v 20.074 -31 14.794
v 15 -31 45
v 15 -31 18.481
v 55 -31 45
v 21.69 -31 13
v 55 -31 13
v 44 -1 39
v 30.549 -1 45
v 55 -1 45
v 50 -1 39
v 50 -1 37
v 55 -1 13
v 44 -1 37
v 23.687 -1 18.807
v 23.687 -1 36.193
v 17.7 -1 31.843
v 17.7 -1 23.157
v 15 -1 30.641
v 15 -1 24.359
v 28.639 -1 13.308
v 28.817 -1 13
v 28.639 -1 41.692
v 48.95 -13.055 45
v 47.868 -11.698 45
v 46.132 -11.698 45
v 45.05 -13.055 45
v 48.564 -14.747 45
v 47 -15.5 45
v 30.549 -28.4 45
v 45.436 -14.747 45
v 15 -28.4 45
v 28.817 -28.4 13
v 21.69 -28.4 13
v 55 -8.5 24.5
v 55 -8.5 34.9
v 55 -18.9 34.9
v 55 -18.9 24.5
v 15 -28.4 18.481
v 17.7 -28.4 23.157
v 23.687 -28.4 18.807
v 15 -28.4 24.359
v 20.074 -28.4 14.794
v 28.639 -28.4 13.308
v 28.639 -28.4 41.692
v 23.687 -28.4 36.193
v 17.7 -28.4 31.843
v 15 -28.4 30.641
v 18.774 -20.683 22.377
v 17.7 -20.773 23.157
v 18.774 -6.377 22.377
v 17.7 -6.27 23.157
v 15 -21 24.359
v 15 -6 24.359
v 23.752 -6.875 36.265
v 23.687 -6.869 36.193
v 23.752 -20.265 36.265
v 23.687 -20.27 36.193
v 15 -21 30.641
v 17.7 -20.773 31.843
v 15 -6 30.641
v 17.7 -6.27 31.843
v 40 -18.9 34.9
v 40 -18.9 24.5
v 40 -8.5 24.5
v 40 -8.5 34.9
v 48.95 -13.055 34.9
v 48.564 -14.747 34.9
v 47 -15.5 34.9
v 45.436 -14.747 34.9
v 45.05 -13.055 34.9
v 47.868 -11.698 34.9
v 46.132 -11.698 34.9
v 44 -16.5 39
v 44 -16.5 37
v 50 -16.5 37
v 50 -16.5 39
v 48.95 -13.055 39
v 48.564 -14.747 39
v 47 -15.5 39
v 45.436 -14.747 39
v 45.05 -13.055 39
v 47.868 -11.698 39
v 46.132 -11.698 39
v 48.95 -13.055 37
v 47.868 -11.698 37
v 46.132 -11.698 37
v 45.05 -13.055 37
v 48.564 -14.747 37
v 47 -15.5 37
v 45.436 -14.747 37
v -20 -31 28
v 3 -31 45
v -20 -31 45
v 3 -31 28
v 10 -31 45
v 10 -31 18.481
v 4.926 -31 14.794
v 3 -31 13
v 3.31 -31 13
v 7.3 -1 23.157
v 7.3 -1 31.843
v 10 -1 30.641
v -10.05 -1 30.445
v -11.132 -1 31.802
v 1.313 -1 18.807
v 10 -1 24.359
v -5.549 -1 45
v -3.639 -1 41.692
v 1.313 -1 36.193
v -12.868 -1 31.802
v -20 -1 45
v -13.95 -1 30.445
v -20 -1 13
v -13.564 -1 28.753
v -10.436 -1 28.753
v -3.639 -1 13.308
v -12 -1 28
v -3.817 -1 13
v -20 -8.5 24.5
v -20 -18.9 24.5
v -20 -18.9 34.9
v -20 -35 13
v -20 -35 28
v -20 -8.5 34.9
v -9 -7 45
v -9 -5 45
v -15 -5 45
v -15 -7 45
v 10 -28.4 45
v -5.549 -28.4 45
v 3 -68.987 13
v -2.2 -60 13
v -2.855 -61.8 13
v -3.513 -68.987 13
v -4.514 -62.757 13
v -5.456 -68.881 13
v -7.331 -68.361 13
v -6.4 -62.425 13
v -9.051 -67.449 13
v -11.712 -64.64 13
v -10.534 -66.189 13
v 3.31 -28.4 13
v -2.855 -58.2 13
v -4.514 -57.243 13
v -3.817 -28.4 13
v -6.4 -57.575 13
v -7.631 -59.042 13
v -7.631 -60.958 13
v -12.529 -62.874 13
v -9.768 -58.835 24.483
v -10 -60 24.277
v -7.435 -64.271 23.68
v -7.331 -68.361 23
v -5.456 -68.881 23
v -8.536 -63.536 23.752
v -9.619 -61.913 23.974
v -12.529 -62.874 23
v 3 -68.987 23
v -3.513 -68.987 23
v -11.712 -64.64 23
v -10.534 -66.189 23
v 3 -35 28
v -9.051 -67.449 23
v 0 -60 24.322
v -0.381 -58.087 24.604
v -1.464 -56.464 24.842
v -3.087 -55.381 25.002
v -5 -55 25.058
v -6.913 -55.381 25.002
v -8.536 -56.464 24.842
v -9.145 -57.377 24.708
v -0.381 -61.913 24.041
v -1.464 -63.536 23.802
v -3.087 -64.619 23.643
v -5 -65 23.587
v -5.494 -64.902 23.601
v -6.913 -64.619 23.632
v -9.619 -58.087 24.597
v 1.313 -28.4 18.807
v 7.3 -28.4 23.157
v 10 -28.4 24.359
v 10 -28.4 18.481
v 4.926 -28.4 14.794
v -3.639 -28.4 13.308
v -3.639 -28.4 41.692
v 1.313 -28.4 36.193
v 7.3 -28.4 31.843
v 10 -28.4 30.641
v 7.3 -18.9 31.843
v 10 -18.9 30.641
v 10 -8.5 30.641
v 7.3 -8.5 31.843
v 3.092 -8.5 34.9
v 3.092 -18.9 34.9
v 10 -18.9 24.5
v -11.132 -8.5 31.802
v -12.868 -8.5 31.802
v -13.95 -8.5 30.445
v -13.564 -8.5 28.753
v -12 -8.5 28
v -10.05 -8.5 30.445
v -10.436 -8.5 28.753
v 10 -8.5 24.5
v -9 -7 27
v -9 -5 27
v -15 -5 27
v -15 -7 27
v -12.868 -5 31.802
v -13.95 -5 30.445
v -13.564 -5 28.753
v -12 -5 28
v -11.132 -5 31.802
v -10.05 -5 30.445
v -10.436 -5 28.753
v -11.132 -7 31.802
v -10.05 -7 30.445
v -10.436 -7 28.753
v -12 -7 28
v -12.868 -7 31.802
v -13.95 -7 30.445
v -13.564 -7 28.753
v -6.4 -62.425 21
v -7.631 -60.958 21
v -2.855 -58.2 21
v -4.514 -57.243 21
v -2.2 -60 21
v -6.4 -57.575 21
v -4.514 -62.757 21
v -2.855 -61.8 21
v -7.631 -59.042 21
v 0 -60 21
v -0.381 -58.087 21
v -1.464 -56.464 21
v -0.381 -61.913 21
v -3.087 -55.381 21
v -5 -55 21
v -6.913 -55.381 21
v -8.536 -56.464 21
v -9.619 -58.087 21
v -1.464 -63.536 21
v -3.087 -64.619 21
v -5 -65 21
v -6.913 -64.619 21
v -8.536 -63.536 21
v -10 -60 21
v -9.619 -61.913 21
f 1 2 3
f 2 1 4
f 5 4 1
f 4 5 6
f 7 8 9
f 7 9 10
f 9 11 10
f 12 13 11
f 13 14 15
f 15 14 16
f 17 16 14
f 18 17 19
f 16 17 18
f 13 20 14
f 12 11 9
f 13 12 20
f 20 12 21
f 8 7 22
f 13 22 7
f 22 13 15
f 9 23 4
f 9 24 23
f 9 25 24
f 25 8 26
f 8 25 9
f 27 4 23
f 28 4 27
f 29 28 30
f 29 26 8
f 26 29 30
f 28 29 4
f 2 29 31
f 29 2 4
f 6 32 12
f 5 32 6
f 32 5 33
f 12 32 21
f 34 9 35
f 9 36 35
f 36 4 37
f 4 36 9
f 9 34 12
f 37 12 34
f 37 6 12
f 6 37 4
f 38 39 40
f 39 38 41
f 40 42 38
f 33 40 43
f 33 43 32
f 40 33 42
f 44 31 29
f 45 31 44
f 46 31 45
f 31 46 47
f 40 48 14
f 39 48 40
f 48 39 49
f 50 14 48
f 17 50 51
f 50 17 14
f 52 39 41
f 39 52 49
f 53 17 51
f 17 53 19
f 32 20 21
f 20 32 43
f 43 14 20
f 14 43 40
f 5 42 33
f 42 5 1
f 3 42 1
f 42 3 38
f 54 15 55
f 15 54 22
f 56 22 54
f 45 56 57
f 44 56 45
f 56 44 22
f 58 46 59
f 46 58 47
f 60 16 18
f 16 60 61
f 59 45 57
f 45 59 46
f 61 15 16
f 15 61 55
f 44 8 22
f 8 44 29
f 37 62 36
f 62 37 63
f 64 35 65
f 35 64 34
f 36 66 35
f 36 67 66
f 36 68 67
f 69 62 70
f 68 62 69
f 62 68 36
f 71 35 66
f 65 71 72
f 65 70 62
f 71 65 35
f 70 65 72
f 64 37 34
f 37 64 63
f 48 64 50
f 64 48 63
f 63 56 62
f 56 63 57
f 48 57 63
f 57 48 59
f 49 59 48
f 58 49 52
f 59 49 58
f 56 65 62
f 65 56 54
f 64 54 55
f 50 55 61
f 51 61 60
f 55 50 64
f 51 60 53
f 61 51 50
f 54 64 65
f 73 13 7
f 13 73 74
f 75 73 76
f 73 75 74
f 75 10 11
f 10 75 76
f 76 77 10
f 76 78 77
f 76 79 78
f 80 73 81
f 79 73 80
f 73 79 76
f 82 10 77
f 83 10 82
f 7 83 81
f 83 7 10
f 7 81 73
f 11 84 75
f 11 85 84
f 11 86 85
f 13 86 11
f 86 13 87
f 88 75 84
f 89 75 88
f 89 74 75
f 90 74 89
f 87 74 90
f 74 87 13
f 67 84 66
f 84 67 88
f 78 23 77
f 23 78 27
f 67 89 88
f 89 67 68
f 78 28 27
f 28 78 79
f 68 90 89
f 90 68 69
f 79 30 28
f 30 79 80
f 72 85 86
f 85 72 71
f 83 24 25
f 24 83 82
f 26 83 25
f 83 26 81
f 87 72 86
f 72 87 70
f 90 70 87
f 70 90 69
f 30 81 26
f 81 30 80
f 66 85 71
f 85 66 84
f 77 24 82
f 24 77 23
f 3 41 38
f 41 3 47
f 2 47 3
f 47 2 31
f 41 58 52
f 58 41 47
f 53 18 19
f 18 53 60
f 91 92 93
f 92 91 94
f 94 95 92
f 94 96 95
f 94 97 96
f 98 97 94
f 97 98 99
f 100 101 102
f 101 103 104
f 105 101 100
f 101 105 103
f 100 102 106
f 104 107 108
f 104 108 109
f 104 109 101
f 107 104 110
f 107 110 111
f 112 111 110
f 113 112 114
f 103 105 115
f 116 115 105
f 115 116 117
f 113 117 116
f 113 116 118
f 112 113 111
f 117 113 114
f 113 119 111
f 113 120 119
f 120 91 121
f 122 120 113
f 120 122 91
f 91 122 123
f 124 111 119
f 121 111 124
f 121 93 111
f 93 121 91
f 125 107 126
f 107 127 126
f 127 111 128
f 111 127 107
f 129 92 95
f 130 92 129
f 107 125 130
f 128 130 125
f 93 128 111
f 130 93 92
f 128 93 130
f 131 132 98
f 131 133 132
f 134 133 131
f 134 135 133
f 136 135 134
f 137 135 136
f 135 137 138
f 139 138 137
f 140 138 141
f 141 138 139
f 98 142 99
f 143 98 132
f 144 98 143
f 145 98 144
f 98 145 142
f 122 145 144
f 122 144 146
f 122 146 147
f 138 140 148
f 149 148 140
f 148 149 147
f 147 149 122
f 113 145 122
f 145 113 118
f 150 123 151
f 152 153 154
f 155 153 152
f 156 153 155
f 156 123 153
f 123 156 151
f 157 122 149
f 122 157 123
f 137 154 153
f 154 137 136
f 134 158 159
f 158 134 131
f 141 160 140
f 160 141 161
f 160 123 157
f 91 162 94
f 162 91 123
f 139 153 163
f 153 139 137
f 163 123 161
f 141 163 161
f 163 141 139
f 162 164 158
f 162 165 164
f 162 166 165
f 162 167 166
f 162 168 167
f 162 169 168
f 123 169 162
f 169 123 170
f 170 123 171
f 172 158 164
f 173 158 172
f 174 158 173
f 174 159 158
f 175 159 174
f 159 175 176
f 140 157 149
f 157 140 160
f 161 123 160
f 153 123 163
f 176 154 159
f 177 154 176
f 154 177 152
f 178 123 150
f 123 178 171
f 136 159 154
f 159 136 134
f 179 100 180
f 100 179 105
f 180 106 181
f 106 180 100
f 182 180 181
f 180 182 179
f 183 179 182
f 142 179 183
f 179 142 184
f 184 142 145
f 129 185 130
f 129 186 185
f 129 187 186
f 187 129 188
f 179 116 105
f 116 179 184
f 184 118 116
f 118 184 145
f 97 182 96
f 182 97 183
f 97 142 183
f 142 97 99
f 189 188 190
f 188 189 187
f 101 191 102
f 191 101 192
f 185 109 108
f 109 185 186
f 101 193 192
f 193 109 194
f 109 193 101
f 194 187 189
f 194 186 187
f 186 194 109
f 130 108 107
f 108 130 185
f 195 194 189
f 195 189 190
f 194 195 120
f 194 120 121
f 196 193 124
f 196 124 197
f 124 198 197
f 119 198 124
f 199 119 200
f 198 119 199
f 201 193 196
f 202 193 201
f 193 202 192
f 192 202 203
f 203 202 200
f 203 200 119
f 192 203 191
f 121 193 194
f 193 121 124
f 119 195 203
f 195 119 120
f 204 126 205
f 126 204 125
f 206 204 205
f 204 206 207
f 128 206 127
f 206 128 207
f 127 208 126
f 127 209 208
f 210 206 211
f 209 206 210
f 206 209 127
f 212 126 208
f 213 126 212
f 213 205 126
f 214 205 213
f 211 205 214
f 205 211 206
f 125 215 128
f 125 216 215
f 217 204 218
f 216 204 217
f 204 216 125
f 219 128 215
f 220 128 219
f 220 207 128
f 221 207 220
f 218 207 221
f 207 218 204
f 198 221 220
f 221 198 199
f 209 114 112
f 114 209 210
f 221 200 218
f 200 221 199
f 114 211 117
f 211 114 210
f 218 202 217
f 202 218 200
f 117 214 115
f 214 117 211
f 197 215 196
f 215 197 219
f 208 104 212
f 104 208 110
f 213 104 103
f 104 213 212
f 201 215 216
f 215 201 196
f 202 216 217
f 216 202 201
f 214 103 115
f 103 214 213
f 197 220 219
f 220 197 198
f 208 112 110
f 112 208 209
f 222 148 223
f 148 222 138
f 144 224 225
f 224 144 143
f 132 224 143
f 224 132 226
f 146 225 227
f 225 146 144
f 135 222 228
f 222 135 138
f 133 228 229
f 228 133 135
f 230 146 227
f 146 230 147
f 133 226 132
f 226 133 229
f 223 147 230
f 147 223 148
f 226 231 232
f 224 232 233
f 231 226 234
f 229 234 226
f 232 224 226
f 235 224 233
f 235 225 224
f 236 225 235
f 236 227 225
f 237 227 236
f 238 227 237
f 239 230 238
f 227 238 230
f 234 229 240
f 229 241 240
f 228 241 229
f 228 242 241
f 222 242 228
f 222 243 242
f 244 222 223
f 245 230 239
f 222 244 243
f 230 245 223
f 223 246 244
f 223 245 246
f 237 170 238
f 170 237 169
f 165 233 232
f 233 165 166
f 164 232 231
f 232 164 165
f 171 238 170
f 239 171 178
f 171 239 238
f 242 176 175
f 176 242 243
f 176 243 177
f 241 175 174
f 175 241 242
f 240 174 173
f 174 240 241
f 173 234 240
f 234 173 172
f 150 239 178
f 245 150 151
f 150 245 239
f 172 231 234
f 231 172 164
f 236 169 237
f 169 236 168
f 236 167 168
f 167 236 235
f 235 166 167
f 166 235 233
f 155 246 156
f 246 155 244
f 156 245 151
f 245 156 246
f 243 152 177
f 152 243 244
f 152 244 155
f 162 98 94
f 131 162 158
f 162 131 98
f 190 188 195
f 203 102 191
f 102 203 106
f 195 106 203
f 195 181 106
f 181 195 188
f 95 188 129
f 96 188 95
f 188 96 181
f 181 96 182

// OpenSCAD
forwarder_wheel_radius =35;
forwarder_wheel_axis_radius =4;
forwarder_wheel_height =50;
forwarder_wheel_space =0.4;
//projection() translate([0,0,45])rotate([0,90,0])	
//	translate([50,41,4])rotate([0,-90,-180])cutblock();

//translate([100,0,0]){
//	gear();
//	translate([25,0,0])gearcutter();
//}

//projection() translate([0,0,83])rotate([0,90,0])	
//rotate([90,0,0])forwarder();


forwarderFront();
translate([25,0,0])forwarderBack();


//funnelblock();

module forwarderFront(){
	difference(){
		rotate([90,0,0])forwarder();
		translate([-100,-90,0])cube([100,100,100]);
	}
}
module forwarderBack(){
	difference(){
		rotate([90,0,0])forwarder();
		translate([0,-90,0])cube([100,100,100]);
	}
}

module funnelblock(){
	scale([1,0.5,1]){
		
		difference(){
			union(){
				difference(){
					union(){
						translate([0,0,0])cylinder(h=50,r=20);
						translate([0,0,0])rotate([0,90,0])cylinder(h=50,r=20);
						translate([50,0,0])rotate([0,0,0])cylinder(h=50,r=20);
						translate([0,0,50])rotate([0,90,0])cylinder(h=50,r=20);
					}
					translate([30.25,-30,19.75])rotate([0,0,90])aluguide();
					translate([-25,0,-25])cube([100,100,100]);
					translate([-25,-25,-25])cube([25,100,100]);
					translate([50,-25,-25])cube([25,100,100]);
					translate([-25,-25,-25])cube([100,100,25]);
					translate([-25,-25,50])cube([100,100,25]);
				}
				
//			translate([-10,-20,-10])cube([10,20,70]);
//			translate([50,-20,-10])cube([10,20,70]);
//			translate([-10,-20,-10])cube([70,20,10]);
//			translate([-10,-20,50])cube([70,20,10]);
			}
			translate([10,23,10]){
				translate([0,0,0])rotate([90,0,0])m3Screw( 30,14);
				translate([30,0,0])rotate([90,0,0])m3Screw(30,14);
				translate([30,0,30])rotate([90,0,0])m3Screw(30,14);
				translate([0,0,30])rotate([90,0,0])m3Screw(30,14);
			}
		}
	}
		
	
		
	
}

module cutblock(){
	mirror([1,0,0])difference(){
		translate([0,-10,0])cube([45,45,15]);
		translate([0,-12,5.4])cube([35,54,1]);
		translate([6,-10,6])cube([10,20,100]);
		translate([6,6,50])rotate([0,90,0])aluguide();
		translate([8,-3,-0.2])nutslotm3(24,25);
//		translate([4,8,-0.2])rotate([0,0,90])nutslotm3(6);
		translate([40,6,-10])rotate([0,0,0])m3Screw(20);
		translate([40,28,-10])rotate([0,0,0])m3Screw(20);
	}
}

module forwarder(){
	difference(){
			union(){
				
				translate([-45,13,1])cube([90,32,30]);
				translate([25,13,1])cube([30,32,30]);
				translate([0,3,0])hull(){
			     translate([-45,10,31])cube([90,15,4]);
				translate([26,20,60])rotate([90,0,0])cylinder(h=10,r=9);
				translate([-29,20,60])rotate([90,0,0])cylinder(h=10,r=9);
				
				}
			}
		translate([-22,0,31])cube([80,50,50]);//save material and time
		translate([-15,0,-18])cube([30,50,50]);//save material and time
		translate([0,-7.5,-2]) {
			translate([0,0,-20])cylinder(h=forwarder_wheel_height+(forwarder_wheel_space),r=forwarder_wheel_radius+forwarder_wheel_space);
			translate([0,0,0])cylinder(h=50,r=30);//gear
			translate([0,70,-20])cylinder(h=forwarder_wheel_height+(forwarder_wheel_space),r=forwarder_wheel_radius+forwarder_wheel_space);
			translate([0,70,0])cylinder(h=100,r=forwarder_wheel_axis_radius);
			translate([0,0,0])cylinder(h=100,r=forwarder_wheel_axis_radius);
		}
		#translate([0,-0.5,-1.5]){
			translate([34,25,10])aluguidefunnel();
			translate([-50,25,10])aluguide();
		}
//		translate([37,22,60])rotate([0,0,-90])nutslotm5();
//		translate([37,46,60])rotate([0,0,-90])nutslotm5();
		
		#translate([-40,27,7])rotate([90,180,180])nutslotm3();
		#translate([50,37,16.5])rotate([180,0,180])nutslotm3();
		translate([25,-4,60])rotate([-90,0,0])m5Screw(25);
		translate([-30,-4,60])rotate([-90,0,0])m5Screw(25);
}
	
}


module aluguide(){
	cube([100,10.4,10.4]);
}
module aluguidefunnel(){
	union(){
		cube([50,10.4,10.4]);
		hull(){
			translate([5,0,0])cube([1,10.4,10.4]);
			translate([-20,-2.5,-2.5])cube([1,15,15]);
		}
}
}
module gear(){
	difference(){
		union(){
			linear_extrude(height = 7, center = true, convexity = 10) import (file = "/home/simon/gearsmall.dxf", layer = "Ebene_1");
			translate([0,0,3.5])cylinder(h=7,r=9);
		}
		translate([0,0,-50])cylinder(h=100,r=3.2);
		translate([-3,4,3])union(){
			cube([6,2,100]);
			translate([3,5,3])rotate([0,90,90])cylinder(h=20,r=2,center=true);
		}
	}
		
}

module gearcutter(){
	difference(){
		union(){
			linear_extrude(height = 7, center = true, convexity = 10) import (file = "/home/simon/gearsmallcutter.dxf", layer = "Ebene_1");
			translate([0,0,3.5])cylinder(h=7,r=9);
		}
		translate([0,0,-50])cylinder(h=100,r=3.2);
		translate([-3,4,3])union(){
			cube([6,2,100]);
			translate([3,5,3])rotate([0,90,90])cylinder(h=20,r=2,center=true);
		}
	}
		
}

module nutslotm3(sh=100,scl=20){
	union(){
		cube([6,2,sh]);
		translate([3,5,3])rotate([0,90,90])cylinder(h=scl,r=2,center=true);
	}
}

module nutslotm5(slh=100,sl=50){
	union(){
		cube([8,3,slh]);
		translate([4,15,4])rotate([0,90,90])cylinder(h=sl,r=2.6,center=true);
	}
}

module m5Screw(h=10) {
	union() {
		cylinder(h=h,r=2.8);
		translate([0,0,h])cylinder(h=20,r=5);
	}
}

module m3Screw(h=15,hh=5.5) {
	union() {
		translate([0,0,5])cylinder(h=h+5,r=3.6/2);
// cylinder(h=5,r=3.6/2);
		translate([0,0,h-0.4])cylinder(h=hh,r=6.3/2);
		translate([0,0,-0.1])cylinder(h=5.5,r=6.9/2,$fn=6);
	}
}
